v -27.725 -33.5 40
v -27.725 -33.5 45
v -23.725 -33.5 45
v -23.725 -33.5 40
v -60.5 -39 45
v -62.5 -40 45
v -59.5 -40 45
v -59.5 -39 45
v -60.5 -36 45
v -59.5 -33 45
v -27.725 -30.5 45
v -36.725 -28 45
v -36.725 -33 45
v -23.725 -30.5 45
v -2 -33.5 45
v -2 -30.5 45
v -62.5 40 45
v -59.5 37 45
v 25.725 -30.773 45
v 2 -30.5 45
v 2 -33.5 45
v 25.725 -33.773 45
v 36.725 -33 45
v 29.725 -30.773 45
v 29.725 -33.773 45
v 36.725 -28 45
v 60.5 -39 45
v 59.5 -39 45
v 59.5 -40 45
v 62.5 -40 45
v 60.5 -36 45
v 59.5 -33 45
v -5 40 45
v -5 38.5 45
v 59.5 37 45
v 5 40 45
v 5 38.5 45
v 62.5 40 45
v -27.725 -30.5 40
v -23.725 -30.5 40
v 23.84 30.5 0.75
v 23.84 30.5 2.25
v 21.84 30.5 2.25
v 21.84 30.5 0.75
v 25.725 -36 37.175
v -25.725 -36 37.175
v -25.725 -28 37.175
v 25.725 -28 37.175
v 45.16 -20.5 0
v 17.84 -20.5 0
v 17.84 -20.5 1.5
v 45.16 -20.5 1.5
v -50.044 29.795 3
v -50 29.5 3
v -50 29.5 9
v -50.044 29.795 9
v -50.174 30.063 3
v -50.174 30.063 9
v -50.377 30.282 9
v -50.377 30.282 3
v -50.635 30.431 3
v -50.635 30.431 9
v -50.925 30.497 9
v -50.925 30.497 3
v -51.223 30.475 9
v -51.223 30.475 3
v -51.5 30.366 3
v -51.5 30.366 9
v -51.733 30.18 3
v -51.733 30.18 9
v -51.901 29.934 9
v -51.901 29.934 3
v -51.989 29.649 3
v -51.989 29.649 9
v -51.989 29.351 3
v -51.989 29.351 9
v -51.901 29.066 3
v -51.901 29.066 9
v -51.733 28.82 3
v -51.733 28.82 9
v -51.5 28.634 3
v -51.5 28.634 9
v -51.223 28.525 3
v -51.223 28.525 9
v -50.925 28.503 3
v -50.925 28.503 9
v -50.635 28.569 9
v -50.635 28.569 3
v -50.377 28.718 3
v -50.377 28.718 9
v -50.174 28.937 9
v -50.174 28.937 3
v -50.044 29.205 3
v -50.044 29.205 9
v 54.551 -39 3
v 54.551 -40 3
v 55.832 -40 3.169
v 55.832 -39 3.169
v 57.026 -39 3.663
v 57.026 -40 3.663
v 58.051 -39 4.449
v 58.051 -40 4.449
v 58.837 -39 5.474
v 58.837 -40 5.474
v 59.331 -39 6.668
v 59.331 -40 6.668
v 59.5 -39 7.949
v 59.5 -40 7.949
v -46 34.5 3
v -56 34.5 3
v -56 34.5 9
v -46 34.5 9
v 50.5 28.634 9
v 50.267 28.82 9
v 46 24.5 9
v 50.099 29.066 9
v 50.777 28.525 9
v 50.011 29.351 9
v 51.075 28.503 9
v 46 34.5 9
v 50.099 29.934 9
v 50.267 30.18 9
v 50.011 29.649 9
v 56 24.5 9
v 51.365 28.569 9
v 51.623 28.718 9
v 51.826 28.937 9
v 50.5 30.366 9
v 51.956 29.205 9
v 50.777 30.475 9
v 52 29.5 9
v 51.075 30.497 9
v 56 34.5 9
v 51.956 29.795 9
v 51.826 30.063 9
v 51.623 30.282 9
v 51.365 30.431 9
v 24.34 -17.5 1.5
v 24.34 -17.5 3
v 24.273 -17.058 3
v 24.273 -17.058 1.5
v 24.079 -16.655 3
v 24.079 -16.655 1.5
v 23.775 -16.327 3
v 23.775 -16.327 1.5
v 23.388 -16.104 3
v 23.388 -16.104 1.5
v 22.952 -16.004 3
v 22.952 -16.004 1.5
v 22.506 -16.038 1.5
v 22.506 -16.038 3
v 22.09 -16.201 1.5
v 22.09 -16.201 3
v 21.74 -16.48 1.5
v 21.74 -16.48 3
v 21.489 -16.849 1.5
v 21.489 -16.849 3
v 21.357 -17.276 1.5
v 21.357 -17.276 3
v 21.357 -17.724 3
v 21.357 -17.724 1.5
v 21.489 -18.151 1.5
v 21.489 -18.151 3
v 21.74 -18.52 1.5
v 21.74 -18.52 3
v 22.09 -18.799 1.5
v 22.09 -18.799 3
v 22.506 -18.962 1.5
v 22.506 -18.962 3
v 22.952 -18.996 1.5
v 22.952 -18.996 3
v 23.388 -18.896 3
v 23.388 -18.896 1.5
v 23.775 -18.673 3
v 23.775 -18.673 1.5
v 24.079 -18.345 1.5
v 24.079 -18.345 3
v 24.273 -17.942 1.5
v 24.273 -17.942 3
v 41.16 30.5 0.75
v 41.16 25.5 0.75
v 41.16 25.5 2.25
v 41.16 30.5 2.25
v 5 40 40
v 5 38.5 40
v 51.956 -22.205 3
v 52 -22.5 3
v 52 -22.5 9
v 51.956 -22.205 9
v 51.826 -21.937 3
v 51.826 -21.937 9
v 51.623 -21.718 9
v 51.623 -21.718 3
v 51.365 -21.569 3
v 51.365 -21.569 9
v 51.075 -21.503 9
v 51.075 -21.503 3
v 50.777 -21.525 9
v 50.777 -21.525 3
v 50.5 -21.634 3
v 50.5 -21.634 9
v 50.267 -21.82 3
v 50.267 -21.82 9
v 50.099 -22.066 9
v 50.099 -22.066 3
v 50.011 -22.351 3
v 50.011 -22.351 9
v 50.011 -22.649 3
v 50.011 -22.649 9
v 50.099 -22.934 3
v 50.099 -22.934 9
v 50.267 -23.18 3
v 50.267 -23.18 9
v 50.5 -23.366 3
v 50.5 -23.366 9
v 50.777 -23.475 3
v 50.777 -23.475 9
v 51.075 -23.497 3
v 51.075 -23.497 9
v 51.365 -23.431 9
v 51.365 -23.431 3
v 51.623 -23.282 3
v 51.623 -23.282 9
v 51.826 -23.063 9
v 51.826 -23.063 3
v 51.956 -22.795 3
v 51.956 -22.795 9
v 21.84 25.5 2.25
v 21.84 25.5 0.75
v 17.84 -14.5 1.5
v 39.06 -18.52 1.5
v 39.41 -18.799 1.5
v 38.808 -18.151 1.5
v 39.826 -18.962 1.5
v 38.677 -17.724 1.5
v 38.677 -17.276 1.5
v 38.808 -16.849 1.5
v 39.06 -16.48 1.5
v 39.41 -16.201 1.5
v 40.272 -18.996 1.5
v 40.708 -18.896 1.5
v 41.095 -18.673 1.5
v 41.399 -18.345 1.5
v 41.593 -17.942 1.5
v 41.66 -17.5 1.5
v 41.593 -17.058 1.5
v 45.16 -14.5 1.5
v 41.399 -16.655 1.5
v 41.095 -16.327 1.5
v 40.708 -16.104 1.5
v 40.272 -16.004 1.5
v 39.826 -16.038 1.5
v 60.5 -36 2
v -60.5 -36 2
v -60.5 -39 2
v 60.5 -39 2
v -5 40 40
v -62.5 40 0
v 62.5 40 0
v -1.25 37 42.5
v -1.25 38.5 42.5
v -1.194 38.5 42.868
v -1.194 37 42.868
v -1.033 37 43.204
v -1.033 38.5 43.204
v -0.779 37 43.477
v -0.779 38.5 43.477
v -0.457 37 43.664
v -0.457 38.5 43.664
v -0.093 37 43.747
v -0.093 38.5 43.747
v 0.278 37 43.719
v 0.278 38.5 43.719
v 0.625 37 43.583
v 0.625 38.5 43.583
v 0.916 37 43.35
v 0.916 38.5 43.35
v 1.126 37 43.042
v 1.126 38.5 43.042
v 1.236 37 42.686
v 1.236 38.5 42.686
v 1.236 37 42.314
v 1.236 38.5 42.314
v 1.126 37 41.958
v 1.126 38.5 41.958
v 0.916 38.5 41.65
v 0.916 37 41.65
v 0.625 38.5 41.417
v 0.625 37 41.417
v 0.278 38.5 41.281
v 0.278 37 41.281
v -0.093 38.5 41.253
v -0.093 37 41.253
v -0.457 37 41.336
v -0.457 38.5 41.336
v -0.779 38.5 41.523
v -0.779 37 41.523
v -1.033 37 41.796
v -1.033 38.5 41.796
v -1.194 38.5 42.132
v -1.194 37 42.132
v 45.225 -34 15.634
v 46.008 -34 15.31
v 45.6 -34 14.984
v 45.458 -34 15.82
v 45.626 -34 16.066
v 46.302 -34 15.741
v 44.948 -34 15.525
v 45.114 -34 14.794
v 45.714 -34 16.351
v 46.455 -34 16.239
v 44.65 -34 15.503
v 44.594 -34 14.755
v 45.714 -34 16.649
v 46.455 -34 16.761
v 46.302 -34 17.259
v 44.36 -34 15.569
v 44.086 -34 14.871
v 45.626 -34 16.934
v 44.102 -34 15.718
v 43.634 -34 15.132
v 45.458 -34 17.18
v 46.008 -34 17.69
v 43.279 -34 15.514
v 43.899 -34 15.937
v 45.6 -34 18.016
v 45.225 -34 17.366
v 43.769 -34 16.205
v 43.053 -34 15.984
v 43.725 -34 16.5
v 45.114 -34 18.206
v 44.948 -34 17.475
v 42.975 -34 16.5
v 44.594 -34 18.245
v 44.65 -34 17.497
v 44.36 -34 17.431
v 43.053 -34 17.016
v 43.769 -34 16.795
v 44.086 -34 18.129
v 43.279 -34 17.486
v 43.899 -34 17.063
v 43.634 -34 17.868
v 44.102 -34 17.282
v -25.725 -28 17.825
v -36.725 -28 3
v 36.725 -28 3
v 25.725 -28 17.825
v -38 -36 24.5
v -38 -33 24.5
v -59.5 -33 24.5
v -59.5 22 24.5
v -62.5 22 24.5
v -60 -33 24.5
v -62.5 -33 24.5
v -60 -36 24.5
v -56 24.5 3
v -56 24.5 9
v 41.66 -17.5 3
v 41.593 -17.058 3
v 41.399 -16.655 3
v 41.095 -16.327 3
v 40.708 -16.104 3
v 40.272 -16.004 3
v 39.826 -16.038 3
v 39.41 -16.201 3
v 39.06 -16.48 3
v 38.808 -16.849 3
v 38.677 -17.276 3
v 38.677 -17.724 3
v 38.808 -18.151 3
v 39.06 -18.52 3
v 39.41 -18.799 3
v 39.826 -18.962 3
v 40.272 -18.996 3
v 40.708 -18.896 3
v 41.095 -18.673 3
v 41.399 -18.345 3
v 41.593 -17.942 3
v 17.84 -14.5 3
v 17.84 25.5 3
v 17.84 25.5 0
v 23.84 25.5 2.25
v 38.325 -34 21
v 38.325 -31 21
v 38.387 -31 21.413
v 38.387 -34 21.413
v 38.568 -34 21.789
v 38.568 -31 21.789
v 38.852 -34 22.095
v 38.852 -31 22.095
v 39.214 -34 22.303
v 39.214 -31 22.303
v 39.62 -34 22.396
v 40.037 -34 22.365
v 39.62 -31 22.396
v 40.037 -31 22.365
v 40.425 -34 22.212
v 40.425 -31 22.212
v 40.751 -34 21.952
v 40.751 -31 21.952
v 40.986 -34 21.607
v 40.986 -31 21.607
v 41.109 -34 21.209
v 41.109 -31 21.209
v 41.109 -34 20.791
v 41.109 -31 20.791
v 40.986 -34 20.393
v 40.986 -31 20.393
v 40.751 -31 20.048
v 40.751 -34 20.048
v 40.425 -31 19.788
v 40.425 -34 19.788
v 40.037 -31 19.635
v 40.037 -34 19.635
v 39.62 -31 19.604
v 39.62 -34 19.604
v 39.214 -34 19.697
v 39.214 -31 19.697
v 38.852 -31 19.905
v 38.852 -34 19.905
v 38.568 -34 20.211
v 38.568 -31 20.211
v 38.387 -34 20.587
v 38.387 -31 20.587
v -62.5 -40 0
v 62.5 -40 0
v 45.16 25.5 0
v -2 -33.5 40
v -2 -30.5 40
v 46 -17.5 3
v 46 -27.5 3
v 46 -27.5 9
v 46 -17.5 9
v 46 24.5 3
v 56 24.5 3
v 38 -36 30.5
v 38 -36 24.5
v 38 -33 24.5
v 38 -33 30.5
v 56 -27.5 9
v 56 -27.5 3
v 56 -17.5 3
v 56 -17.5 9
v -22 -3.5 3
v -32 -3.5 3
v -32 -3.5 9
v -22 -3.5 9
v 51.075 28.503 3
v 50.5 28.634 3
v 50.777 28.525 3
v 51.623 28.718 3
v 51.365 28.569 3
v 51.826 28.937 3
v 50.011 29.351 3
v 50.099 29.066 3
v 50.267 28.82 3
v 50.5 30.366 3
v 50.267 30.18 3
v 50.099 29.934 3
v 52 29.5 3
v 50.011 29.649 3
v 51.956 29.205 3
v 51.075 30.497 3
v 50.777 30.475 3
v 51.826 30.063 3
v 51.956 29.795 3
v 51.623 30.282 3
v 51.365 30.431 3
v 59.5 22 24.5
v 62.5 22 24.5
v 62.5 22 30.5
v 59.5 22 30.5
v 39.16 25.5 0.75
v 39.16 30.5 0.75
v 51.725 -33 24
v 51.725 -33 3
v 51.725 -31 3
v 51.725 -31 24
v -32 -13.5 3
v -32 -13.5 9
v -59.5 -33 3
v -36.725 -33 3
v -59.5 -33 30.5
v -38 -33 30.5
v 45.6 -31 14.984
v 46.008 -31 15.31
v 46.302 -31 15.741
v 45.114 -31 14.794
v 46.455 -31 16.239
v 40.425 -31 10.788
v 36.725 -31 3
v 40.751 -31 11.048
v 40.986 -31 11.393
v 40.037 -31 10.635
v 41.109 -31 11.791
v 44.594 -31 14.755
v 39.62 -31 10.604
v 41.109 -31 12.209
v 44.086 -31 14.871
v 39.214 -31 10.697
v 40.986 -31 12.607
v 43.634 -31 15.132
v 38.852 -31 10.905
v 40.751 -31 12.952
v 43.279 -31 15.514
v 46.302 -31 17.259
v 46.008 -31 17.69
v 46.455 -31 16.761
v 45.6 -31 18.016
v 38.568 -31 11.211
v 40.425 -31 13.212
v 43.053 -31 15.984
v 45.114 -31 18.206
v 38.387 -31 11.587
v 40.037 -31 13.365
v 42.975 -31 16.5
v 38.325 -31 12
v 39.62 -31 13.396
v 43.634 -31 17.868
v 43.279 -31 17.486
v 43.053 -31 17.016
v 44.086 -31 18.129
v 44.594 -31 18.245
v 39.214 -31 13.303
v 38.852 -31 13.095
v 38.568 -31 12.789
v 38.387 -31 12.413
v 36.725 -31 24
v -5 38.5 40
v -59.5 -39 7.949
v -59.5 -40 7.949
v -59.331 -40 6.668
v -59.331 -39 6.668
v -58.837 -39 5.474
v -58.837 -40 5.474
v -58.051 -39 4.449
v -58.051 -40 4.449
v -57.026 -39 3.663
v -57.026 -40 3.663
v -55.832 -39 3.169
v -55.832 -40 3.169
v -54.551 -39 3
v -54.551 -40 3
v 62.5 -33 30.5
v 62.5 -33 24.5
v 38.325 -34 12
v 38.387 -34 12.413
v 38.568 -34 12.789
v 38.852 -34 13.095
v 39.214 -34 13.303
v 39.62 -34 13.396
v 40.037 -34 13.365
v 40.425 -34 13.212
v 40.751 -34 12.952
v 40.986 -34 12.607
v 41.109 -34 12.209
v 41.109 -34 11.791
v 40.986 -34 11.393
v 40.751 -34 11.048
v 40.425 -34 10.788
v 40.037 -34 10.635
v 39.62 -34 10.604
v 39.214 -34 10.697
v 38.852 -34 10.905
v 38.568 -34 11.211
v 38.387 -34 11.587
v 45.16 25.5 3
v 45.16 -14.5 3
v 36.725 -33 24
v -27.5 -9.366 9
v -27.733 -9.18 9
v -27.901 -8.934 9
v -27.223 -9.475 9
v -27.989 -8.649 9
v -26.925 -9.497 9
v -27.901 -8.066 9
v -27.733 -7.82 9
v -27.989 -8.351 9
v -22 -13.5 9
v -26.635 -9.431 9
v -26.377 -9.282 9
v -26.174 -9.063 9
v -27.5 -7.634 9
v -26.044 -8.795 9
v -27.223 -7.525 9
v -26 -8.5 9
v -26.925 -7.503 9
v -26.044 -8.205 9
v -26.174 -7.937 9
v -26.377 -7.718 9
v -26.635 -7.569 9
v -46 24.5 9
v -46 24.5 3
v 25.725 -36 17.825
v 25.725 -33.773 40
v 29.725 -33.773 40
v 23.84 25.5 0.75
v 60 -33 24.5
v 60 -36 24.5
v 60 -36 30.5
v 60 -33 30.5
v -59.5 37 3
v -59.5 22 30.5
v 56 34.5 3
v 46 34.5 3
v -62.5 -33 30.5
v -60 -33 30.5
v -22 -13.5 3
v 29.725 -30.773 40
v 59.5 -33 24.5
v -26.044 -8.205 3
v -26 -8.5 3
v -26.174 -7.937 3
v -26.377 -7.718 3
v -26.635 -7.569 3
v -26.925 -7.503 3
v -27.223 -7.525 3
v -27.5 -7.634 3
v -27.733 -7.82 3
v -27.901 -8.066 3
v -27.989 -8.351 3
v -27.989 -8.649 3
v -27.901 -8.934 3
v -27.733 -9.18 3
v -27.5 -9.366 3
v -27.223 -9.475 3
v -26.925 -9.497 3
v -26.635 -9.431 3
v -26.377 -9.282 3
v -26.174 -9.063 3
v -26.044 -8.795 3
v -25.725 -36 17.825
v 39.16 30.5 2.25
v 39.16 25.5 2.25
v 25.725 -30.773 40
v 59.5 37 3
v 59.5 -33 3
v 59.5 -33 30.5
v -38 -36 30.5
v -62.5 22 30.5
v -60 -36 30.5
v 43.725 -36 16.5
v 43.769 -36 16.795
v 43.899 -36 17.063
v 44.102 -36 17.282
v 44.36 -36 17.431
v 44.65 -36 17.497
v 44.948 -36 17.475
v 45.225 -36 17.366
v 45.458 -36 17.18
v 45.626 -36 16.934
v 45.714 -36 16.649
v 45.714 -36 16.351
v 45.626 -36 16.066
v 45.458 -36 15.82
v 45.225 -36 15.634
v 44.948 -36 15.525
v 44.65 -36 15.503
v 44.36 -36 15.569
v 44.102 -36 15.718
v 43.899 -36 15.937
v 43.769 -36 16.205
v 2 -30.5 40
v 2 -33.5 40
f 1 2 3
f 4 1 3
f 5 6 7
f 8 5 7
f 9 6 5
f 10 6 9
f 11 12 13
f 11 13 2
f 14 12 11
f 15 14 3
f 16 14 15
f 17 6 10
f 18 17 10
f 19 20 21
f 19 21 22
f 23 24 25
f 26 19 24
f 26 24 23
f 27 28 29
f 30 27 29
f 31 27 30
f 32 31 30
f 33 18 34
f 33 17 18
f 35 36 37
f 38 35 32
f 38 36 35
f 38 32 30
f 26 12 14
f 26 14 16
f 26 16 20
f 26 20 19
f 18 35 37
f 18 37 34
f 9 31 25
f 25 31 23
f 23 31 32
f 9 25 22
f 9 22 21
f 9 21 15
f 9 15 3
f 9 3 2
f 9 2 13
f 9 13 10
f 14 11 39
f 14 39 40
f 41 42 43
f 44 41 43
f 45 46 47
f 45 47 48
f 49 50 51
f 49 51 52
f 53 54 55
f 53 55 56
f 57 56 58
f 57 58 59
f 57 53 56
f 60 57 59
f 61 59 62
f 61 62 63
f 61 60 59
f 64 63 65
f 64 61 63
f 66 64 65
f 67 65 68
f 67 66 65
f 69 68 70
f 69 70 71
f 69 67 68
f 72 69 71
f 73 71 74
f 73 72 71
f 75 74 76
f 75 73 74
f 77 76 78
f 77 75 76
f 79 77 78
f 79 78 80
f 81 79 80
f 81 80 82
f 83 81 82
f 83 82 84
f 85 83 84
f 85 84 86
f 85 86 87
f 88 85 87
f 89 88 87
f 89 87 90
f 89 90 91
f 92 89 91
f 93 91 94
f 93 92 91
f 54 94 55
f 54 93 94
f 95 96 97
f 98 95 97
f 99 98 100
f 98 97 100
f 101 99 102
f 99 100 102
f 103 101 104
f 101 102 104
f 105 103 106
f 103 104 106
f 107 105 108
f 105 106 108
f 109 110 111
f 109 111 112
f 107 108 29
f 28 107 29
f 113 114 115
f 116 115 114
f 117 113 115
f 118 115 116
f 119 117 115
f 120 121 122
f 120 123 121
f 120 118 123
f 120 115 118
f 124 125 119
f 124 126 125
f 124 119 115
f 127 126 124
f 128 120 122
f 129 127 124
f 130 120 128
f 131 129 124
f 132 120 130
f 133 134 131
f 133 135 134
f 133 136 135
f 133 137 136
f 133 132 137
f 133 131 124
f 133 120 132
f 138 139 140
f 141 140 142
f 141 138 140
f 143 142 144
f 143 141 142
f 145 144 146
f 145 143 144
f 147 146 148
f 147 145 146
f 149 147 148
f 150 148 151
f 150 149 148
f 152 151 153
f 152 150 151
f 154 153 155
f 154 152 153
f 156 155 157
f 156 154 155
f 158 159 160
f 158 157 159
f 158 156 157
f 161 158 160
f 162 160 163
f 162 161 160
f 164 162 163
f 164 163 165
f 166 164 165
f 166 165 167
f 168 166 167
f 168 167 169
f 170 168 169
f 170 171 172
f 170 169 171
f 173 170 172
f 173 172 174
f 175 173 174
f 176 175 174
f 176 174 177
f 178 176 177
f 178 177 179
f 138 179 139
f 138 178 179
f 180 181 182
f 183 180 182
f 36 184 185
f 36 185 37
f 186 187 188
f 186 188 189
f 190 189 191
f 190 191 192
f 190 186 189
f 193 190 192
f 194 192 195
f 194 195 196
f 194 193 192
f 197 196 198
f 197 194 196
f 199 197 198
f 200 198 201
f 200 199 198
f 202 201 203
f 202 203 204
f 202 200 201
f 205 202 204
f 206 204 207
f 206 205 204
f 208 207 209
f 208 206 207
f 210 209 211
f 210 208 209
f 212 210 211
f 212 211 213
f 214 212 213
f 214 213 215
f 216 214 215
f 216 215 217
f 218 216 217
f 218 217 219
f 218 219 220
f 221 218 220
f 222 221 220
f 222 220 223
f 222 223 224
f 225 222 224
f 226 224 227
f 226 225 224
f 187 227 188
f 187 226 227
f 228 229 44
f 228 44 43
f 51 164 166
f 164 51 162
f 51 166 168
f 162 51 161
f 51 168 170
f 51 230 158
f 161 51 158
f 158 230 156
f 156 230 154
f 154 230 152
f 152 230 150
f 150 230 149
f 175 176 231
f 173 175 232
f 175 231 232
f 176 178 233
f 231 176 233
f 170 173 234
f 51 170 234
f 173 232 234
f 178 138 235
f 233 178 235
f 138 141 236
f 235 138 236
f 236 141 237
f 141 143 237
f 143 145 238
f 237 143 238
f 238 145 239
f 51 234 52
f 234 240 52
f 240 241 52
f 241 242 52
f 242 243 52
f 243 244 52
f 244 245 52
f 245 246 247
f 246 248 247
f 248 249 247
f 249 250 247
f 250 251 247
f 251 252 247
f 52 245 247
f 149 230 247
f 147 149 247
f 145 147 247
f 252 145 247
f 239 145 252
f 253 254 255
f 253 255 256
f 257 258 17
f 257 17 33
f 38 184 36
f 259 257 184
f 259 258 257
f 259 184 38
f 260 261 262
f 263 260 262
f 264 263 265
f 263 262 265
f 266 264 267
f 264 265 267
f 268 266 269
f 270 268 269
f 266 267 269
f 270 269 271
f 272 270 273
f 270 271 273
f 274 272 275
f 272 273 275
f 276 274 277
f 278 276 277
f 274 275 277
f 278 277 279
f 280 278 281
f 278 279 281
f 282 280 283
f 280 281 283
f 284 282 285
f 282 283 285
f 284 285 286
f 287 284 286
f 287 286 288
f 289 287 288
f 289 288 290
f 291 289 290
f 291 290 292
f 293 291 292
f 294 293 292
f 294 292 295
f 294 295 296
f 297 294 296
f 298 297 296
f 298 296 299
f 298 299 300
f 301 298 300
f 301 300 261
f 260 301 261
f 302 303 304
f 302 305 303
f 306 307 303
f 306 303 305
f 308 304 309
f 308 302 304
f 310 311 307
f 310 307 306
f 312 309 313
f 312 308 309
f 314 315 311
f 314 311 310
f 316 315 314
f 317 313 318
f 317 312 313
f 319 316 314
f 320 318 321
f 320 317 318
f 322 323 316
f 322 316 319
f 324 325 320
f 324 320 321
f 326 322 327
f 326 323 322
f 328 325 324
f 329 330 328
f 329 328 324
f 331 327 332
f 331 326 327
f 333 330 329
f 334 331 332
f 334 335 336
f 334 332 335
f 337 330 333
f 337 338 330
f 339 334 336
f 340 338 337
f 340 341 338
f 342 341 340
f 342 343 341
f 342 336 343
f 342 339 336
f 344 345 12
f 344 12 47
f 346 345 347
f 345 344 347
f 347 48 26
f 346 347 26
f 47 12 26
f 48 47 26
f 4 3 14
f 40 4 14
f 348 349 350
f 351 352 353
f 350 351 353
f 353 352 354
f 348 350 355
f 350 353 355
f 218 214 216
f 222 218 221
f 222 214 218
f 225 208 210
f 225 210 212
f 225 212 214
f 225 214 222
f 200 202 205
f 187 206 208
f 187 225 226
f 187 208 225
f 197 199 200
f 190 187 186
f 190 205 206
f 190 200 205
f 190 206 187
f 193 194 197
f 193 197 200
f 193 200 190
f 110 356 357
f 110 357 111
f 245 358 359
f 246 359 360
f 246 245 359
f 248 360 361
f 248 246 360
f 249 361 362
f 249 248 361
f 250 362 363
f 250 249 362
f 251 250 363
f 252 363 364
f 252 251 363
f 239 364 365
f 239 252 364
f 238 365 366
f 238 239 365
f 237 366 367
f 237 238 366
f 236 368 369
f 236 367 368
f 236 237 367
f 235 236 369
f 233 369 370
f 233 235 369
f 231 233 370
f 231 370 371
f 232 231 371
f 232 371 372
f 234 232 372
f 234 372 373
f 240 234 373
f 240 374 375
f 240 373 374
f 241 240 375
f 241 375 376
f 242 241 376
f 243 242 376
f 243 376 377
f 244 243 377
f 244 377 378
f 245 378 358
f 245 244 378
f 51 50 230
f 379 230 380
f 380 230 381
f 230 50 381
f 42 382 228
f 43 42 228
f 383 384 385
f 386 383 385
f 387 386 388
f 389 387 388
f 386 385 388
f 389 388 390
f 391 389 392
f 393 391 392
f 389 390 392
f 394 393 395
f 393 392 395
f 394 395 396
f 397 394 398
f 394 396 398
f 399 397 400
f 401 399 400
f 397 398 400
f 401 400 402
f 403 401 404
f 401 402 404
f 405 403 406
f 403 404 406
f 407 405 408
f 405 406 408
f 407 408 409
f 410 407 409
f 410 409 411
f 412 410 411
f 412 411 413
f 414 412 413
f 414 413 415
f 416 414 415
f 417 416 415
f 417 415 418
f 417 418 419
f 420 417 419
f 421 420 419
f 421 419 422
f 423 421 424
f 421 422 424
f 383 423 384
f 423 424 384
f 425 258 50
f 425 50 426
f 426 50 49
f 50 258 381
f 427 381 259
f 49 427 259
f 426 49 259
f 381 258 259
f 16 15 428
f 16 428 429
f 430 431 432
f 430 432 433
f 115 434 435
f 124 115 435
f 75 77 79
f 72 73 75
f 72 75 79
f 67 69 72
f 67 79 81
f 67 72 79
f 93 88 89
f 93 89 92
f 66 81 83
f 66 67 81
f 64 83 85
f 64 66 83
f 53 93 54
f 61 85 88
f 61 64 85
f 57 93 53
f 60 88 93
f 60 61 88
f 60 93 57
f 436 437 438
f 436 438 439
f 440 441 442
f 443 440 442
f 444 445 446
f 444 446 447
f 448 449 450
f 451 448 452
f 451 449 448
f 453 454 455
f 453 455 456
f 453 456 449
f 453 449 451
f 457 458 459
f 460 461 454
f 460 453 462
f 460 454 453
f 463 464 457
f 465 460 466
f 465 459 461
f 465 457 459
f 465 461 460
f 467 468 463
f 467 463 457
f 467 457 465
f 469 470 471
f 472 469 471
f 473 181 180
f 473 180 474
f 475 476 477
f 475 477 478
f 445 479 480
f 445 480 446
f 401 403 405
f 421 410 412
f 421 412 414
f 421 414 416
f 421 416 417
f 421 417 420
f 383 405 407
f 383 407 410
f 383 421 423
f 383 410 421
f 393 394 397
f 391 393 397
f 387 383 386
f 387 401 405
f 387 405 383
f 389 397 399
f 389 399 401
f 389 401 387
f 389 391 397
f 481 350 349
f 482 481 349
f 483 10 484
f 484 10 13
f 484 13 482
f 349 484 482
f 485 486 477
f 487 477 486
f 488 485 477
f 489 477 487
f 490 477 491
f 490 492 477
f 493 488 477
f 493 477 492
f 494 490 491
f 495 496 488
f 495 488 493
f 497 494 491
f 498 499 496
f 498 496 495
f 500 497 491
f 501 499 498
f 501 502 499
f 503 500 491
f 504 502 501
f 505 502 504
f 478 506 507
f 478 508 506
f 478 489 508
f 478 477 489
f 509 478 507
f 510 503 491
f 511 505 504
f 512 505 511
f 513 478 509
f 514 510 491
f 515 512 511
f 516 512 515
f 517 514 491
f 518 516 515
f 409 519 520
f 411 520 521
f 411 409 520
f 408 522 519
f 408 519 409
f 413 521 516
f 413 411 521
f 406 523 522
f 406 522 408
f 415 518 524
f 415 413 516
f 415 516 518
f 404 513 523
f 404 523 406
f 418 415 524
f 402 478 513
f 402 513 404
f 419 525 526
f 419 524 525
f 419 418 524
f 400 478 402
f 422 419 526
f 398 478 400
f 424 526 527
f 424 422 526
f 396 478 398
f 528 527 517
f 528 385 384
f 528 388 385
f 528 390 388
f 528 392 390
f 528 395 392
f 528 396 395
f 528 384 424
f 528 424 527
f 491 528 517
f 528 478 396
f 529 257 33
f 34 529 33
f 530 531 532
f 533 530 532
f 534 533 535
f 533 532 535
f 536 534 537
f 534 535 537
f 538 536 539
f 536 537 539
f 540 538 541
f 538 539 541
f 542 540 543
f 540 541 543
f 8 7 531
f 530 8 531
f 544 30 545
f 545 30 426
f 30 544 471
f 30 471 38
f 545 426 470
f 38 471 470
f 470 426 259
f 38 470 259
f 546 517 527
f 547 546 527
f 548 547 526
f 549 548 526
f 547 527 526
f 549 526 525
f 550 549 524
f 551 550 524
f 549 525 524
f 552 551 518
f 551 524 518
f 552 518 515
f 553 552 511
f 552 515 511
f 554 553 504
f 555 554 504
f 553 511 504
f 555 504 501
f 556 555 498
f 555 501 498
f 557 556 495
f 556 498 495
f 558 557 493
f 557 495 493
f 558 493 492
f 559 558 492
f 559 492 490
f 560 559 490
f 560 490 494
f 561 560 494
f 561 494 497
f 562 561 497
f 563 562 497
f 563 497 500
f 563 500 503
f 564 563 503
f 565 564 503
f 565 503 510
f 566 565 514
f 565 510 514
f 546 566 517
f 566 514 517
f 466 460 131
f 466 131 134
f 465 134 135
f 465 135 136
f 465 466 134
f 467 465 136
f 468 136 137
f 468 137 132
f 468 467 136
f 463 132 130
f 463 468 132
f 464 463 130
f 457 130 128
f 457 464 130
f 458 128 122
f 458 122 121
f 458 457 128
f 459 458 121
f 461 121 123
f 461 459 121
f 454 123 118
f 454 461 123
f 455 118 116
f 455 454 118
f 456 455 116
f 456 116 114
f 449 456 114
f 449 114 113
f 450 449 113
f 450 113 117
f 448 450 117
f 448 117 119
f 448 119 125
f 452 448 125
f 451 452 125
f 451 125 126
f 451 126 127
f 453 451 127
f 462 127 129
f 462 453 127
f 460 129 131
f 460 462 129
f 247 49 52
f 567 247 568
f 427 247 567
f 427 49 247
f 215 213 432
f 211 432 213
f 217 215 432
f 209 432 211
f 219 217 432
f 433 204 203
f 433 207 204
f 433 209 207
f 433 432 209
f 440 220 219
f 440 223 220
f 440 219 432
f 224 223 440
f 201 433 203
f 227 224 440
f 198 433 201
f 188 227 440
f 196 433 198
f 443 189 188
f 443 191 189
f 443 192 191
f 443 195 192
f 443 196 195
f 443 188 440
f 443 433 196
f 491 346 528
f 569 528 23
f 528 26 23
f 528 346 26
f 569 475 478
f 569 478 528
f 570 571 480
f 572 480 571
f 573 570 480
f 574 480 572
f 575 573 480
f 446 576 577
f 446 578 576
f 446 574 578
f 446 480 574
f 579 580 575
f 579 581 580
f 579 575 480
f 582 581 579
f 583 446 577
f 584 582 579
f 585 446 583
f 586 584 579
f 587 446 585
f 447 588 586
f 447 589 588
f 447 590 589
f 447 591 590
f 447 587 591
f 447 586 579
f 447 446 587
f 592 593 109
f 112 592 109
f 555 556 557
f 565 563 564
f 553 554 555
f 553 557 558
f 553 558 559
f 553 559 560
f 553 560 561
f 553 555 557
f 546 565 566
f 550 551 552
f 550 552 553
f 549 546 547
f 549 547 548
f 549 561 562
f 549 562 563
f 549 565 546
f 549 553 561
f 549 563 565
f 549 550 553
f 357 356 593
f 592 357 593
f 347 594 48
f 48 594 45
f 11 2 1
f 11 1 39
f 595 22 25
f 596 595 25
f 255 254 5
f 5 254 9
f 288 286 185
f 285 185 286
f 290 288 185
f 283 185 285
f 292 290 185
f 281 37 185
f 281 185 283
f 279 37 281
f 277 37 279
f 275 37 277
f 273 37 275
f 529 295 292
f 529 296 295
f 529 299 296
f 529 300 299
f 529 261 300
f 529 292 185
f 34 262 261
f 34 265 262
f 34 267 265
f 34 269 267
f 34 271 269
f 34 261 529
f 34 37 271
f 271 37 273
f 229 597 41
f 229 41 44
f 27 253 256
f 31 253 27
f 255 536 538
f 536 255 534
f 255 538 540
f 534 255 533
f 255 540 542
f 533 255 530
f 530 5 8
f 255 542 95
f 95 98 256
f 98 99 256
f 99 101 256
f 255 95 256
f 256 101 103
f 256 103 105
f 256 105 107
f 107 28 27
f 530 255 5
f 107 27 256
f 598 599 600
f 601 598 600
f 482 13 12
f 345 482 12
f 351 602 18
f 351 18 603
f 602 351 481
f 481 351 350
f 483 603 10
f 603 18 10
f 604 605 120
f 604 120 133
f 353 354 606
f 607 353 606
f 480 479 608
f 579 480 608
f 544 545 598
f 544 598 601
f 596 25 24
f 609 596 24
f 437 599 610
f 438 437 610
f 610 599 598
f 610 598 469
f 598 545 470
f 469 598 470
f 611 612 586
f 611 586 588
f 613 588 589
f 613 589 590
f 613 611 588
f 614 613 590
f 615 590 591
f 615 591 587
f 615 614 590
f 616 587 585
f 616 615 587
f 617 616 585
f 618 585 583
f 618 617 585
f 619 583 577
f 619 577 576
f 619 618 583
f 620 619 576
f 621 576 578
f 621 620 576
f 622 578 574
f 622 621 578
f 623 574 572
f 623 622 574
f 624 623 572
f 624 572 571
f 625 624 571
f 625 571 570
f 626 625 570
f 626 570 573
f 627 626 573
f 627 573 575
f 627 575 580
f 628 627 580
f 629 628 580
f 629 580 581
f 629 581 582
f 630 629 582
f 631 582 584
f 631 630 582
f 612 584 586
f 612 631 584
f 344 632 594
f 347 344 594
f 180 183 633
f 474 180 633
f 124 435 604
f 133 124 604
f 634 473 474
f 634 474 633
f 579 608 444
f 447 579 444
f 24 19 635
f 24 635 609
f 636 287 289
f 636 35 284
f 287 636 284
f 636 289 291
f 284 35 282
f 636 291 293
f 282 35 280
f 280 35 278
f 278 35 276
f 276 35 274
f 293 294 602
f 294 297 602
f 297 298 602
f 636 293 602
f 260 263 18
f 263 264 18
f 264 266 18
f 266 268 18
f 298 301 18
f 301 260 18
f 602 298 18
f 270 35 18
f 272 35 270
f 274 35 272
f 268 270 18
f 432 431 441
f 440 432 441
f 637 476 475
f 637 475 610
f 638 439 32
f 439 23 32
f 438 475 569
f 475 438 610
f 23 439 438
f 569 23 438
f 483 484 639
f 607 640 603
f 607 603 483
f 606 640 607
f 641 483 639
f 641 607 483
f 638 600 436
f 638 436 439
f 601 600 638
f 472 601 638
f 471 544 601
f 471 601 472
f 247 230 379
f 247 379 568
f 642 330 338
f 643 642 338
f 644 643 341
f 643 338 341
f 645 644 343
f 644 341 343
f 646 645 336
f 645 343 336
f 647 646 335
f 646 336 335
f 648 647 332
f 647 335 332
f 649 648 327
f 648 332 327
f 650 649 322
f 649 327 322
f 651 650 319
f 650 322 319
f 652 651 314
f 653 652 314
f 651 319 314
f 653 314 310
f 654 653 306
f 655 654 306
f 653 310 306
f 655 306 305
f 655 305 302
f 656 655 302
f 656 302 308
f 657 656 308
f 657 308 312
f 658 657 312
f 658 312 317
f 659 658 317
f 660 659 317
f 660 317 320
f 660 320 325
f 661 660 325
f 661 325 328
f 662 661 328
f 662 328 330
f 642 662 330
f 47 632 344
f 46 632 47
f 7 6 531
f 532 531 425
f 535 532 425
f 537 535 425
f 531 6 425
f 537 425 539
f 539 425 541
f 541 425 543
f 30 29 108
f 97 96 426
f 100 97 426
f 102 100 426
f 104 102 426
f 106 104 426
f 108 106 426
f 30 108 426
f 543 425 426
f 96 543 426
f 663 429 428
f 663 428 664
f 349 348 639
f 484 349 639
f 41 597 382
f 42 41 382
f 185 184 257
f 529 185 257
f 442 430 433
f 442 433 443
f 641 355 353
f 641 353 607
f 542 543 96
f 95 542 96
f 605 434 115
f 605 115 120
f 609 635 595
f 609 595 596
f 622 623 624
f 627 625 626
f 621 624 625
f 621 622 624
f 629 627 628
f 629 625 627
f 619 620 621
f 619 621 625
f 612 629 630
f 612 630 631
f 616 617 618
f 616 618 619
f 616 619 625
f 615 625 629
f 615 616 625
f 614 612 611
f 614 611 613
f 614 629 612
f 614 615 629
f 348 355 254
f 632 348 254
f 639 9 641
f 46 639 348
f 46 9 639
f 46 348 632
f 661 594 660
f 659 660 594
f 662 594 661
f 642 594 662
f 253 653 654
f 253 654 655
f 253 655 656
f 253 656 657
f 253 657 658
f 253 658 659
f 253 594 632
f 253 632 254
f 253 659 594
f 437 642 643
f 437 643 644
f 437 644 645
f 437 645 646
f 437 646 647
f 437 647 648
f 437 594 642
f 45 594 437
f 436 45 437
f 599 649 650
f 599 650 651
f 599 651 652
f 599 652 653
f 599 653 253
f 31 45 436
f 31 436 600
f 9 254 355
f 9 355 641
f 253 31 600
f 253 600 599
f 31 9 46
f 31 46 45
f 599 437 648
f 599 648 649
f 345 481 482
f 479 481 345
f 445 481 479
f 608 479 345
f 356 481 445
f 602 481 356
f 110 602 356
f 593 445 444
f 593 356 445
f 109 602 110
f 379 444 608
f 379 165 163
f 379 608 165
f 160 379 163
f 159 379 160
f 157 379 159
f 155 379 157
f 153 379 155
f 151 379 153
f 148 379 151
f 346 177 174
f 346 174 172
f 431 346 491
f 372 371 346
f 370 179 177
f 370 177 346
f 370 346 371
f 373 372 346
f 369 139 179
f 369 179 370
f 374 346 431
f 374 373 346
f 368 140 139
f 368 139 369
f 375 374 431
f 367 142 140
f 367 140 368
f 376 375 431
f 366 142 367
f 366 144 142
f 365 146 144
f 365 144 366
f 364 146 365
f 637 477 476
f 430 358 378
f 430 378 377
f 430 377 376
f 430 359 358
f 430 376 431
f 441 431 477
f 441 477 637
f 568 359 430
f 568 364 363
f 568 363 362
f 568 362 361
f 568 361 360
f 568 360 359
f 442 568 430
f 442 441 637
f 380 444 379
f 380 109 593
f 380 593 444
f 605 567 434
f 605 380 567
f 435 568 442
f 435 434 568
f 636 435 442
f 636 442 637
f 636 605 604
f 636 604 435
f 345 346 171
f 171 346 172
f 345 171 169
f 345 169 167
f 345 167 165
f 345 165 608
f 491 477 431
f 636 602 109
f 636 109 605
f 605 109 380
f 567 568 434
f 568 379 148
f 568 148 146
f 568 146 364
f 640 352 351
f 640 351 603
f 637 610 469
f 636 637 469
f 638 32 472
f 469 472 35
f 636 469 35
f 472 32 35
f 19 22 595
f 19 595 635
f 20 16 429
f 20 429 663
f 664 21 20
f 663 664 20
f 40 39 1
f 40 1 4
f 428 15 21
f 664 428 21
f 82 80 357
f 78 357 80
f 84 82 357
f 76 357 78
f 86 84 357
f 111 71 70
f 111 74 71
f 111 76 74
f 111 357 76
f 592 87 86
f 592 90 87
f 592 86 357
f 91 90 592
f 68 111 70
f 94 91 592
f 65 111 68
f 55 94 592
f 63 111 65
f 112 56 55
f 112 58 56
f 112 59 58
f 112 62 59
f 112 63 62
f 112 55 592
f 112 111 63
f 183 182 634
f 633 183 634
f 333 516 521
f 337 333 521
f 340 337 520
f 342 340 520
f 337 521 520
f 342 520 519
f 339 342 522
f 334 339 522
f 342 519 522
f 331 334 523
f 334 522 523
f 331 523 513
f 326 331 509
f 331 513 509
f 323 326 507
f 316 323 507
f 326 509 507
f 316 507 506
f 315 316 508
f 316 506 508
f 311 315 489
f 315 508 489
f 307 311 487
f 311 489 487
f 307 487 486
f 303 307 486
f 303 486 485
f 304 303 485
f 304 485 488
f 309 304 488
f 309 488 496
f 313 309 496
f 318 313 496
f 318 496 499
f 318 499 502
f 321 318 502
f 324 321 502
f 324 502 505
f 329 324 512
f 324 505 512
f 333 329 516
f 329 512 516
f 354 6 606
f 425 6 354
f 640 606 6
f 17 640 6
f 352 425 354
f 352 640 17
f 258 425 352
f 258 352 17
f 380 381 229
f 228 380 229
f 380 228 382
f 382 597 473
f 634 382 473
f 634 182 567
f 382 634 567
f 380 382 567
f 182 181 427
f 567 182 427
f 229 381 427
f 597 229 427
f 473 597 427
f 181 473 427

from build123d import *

# Parameters (mm, degrees)
F0_W      = 125
F0_H      = 80
F1_DEPTH  = 45
F3_DEPTH  = 4
F4_W      = 121
F4_H      = 46.7722373752
F5_DEPTH  = 3
F6_W      = 51.45
F6_H      = 19.35
F6_W_2    = 22
F6_H_2    = 6
F7_DEPTH  = 50
F9_DEPTH  = 42
F10_W     = 10
F10_H     = 10
F10_R     = 1
F11_DEPTH = 6
F12_W     = 55
F12_H     = 6
F13_DEPTH = 10
F14_W     = 55
F14_H     = 6
F15_DEPTH = 10
F16_W     = 27.3198820651
F16_H     = 40
F17_DEPTH = 25
F19_W     = 2
F19_H     = 1.5
F20_DEPTH = 5
F21_W     = 27.3198820651
F21_H     = 6
F22_DEPTH = 1.5
F24_R     = 1.5
F25_DEPTH = 10
F26_W     = 4
F26_H     = 3
F27_DEPTH = 5
F28_W     = 10
F28_H     = 10
F29_DEPTH = 1.5
F30_R     = 1.25
F31_DEPTH = 10
F32_W     = 15
F32_H     = 21
F33_DEPTH = 2
F34_R     = 1.4
F34_R_2   = 1.75
F35_DEPTH = 3
F36_R     = 1
F37_DEPTH = 25


# Not quite as in the source:
# - a feature names something its author has since deleted; it is built from what else it names


with BuildPart() as f1:
    # F0 (on Top) → F1 (new body)
    with BuildSketch(Plane.XY):
        Rectangle(F0_W, F0_H)
    extrude(amount=F1_DEPTH)

    # F2 (on face) → F3 (cut)
    with BuildSketch(Plane.XZ.offset(40)):
        with BuildLine():
            Line((-59.5, 47), (-59.5, 7.948817455))
            ThreePointArc((-59.5, 7.948817455), (-58.0505249263, 4.4494750737), (-54.551182545, 3))
            Line((-54.551182545, 3), (0, 3))
            Line((0, 3), (54.551182545, 3))
            ThreePointArc((54.551182545, 3), (58.0505249263, 4.4494750737), (59.5, 7.948817455))
            Line((59.5, 7.948817455), (59.5, 47))
            Line((59.5, 47), (0, 47))
            Line((0, 47), (-59.5, 47))
        make_face()
    extrude(amount=-F3_DEPTH, mode=Mode.SUBTRACT)

    # F4 (on face) → F5 (cut)
    with BuildSketch(Plane.XZ.offset(36)):
        with Locations((0, 25.3861186876)):
            Rectangle(F4_W, F4_H)
    extrude(amount=F5_DEPTH, mode=Mode.SUBTRACT)

    # F6 (on face) → F7 (cut)
    with BuildSketch(Plane.XZ.offset(36)):
        with Locations((0, 27.5)):
            Rectangle(F6_W, F6_H)
        with Locations((-49, 27.5)):
            Rectangle(F6_W_2, F6_H_2)
        with Locations((49, 27.5)):
            Rectangle(F6_W_2, F6_H_2)
    extrude(amount=-F7_DEPTH, mode=Mode.SUBTRACT)

    # F8 (on face) → F9 (cut)
    with BuildSketch(Plane.XY.offset(45)):
        Polygon((-36.725, -28), (0, -28), (0, 37), (-59.5, 37), (-59.5, -33), (-36.725, -33), align=None)
        Polygon((0, 37), (0, -28), (36.725, -28), (36.725, -33), (59.5, -33), (59.5, 37), align=None)
    extrude(amount=-F9_DEPTH, mode=Mode.SUBTRACT)

    # F10 (on face) → F11 (join)
    with BuildSketch(Plane.XY.offset(3)):
        with Locations((-51, 29.5)):
            Rectangle(F10_W, F10_H)
        with Locations((-51, 29.5)):
            Circle(F10_R, mode=Mode.SUBTRACT)
        with Locations((51, 29.5)):
            Rectangle(F10_W, F10_H)
        with Locations((51, 29.5)):
            Circle(F10_R, mode=Mode.SUBTRACT)
        with Locations((51, -22.5)):
            Rectangle(F10_W, F10_H)
        with Locations((51, -22.5)):
            Circle(F10_R, mode=Mode.SUBTRACT)
        with Locations((-27, -8.5)):
            Rectangle(F10_W, F10_H)
        with Locations((-27, -8.5)):
            Circle(F10_R, mode=Mode.SUBTRACT)
    extrude(amount=F11_DEPTH)

    # F12 (on face) → F13 (cut)
    with BuildSketch(Plane(origin=(-62.5, 0, 0), x_dir=(0, -1, 0), z_dir=(-1, 0, 0))):
        with Locations((5.5, 27.5)):
            Rectangle(F12_W, F12_H)
    extrude(amount=-F13_DEPTH, mode=Mode.SUBTRACT)

    # F14 (on face) → F15 (cut)
    with BuildSketch(Plane.YZ.offset(62.5)):
        with Locations((-5.5, 27.5)):
            Rectangle(F14_W, F14_H)
    extrude(amount=-F15_DEPTH, mode=Mode.SUBTRACT)

    # F16 (on face) → F17 (cut)
    with BuildSketch(Plane.XY):
        with Locations((31.5, 5.5)):
            Rectangle(F16_W, F16_H)
    extrude(amount=F17_DEPTH, mode=Mode.SUBTRACT)

    # F19 (on offset) → F20 (cut)
    with BuildSketch(Plane(origin=(0, 25.5, 0), x_dir=(-1, 0, 0), z_dir=(0, 1, 0))):
        with Locations((-22.8400589675, 1.5)):
            Rectangle(F19_W, F19_H)
        with Locations((-40.1599410325, 1.5)):
            Rectangle(F19_W, F19_H)
    extrude(amount=F20_DEPTH, mode=Mode.SUBTRACT)

    # F21 (on face) → F22 (cut)
    with BuildSketch(Plane.XY):
        with Locations((31.5, -17.5)):
            Rectangle(F21_W, F21_H)
    extrude(amount=F22_DEPTH, mode=Mode.SUBTRACT)

    # F24 (on offset) → F25 (cut)
    with BuildSketch(Plane.XY.offset(1.5)):
        with Locations((22.8400589675, -17.5)):
            Circle(F24_R)
        with Locations((40.1599410325, -17.5)):
            Circle(F24_R)
    extrude(amount=F25_DEPTH, mode=Mode.SUBTRACT)

    # F26 (on face) → F27 (cut)
    with BuildSketch(Plane.XY.offset(45)):
        with Locations((0, -32)):
            Rectangle(F26_W, F26_H)
        with Locations((-25.725, -32)):
            Rectangle(F26_W, F26_H)
        with Locations((27.725, -32.2728008032)):
            Rectangle(F26_W, F26_H)
    extrude(amount=-F27_DEPTH, mode=Mode.SUBTRACT)

    # F28 (on face) → F29 (cut)
    with BuildSketch(Plane(origin=(0, 40, 0), x_dir=(-1, 0, 0), z_dir=(0, 1, 0))):
        with Locations((0, 45)):
            Rectangle(F28_W, F28_H)
    extrude(amount=-F29_DEPTH, mode=Mode.SUBTRACT)

    # F30 (on face) → F31 (cut)
    with BuildSketch(Plane(origin=(0, 38.5, 0), x_dir=(-1, 0, 0), z_dir=(0, 1, 0))):
        with Locations((0, 42.5)):
            Circle(F30_R)
    extrude(amount=-F31_DEPTH, mode=Mode.SUBTRACT)

    # F32 (on face) → F33 (join)
    with BuildSketch(Plane(origin=(0, -33, 0), x_dir=(-1, 0, 0), z_dir=(0, 1, 0))):
        with Locations((-44.225, 13.5)):
            Rectangle(F32_W, F32_H)
    extrude(amount=F33_DEPTH)

    # F34 (on face) → F35 (cut)
    with BuildSketch(Plane(origin=(0, -31, 0), x_dir=(-1, 0, 0), z_dir=(0, 1, 0))):
        with Locations((-39.725, 21)):
            Circle(F34_R)
        with Locations((-39.725, 12)):
            Circle(F34_R)
        with Locations((-44.725, 16.5)):
            Circle(F34_R_2)
    extrude(amount=-F35_DEPTH, mode=Mode.SUBTRACT)

    # F36 (on face) → F37 (cut)
    with BuildSketch(Plane(origin=(0, -34, 0), x_dir=(-1, 0, 0), z_dir=(0, 1, 0))):
        with Locations((-44.725, 16.5)):
            Circle(F36_R)
    extrude(amount=-F37_DEPTH, mode=Mode.SUBTRACT)


solid = f1.part
